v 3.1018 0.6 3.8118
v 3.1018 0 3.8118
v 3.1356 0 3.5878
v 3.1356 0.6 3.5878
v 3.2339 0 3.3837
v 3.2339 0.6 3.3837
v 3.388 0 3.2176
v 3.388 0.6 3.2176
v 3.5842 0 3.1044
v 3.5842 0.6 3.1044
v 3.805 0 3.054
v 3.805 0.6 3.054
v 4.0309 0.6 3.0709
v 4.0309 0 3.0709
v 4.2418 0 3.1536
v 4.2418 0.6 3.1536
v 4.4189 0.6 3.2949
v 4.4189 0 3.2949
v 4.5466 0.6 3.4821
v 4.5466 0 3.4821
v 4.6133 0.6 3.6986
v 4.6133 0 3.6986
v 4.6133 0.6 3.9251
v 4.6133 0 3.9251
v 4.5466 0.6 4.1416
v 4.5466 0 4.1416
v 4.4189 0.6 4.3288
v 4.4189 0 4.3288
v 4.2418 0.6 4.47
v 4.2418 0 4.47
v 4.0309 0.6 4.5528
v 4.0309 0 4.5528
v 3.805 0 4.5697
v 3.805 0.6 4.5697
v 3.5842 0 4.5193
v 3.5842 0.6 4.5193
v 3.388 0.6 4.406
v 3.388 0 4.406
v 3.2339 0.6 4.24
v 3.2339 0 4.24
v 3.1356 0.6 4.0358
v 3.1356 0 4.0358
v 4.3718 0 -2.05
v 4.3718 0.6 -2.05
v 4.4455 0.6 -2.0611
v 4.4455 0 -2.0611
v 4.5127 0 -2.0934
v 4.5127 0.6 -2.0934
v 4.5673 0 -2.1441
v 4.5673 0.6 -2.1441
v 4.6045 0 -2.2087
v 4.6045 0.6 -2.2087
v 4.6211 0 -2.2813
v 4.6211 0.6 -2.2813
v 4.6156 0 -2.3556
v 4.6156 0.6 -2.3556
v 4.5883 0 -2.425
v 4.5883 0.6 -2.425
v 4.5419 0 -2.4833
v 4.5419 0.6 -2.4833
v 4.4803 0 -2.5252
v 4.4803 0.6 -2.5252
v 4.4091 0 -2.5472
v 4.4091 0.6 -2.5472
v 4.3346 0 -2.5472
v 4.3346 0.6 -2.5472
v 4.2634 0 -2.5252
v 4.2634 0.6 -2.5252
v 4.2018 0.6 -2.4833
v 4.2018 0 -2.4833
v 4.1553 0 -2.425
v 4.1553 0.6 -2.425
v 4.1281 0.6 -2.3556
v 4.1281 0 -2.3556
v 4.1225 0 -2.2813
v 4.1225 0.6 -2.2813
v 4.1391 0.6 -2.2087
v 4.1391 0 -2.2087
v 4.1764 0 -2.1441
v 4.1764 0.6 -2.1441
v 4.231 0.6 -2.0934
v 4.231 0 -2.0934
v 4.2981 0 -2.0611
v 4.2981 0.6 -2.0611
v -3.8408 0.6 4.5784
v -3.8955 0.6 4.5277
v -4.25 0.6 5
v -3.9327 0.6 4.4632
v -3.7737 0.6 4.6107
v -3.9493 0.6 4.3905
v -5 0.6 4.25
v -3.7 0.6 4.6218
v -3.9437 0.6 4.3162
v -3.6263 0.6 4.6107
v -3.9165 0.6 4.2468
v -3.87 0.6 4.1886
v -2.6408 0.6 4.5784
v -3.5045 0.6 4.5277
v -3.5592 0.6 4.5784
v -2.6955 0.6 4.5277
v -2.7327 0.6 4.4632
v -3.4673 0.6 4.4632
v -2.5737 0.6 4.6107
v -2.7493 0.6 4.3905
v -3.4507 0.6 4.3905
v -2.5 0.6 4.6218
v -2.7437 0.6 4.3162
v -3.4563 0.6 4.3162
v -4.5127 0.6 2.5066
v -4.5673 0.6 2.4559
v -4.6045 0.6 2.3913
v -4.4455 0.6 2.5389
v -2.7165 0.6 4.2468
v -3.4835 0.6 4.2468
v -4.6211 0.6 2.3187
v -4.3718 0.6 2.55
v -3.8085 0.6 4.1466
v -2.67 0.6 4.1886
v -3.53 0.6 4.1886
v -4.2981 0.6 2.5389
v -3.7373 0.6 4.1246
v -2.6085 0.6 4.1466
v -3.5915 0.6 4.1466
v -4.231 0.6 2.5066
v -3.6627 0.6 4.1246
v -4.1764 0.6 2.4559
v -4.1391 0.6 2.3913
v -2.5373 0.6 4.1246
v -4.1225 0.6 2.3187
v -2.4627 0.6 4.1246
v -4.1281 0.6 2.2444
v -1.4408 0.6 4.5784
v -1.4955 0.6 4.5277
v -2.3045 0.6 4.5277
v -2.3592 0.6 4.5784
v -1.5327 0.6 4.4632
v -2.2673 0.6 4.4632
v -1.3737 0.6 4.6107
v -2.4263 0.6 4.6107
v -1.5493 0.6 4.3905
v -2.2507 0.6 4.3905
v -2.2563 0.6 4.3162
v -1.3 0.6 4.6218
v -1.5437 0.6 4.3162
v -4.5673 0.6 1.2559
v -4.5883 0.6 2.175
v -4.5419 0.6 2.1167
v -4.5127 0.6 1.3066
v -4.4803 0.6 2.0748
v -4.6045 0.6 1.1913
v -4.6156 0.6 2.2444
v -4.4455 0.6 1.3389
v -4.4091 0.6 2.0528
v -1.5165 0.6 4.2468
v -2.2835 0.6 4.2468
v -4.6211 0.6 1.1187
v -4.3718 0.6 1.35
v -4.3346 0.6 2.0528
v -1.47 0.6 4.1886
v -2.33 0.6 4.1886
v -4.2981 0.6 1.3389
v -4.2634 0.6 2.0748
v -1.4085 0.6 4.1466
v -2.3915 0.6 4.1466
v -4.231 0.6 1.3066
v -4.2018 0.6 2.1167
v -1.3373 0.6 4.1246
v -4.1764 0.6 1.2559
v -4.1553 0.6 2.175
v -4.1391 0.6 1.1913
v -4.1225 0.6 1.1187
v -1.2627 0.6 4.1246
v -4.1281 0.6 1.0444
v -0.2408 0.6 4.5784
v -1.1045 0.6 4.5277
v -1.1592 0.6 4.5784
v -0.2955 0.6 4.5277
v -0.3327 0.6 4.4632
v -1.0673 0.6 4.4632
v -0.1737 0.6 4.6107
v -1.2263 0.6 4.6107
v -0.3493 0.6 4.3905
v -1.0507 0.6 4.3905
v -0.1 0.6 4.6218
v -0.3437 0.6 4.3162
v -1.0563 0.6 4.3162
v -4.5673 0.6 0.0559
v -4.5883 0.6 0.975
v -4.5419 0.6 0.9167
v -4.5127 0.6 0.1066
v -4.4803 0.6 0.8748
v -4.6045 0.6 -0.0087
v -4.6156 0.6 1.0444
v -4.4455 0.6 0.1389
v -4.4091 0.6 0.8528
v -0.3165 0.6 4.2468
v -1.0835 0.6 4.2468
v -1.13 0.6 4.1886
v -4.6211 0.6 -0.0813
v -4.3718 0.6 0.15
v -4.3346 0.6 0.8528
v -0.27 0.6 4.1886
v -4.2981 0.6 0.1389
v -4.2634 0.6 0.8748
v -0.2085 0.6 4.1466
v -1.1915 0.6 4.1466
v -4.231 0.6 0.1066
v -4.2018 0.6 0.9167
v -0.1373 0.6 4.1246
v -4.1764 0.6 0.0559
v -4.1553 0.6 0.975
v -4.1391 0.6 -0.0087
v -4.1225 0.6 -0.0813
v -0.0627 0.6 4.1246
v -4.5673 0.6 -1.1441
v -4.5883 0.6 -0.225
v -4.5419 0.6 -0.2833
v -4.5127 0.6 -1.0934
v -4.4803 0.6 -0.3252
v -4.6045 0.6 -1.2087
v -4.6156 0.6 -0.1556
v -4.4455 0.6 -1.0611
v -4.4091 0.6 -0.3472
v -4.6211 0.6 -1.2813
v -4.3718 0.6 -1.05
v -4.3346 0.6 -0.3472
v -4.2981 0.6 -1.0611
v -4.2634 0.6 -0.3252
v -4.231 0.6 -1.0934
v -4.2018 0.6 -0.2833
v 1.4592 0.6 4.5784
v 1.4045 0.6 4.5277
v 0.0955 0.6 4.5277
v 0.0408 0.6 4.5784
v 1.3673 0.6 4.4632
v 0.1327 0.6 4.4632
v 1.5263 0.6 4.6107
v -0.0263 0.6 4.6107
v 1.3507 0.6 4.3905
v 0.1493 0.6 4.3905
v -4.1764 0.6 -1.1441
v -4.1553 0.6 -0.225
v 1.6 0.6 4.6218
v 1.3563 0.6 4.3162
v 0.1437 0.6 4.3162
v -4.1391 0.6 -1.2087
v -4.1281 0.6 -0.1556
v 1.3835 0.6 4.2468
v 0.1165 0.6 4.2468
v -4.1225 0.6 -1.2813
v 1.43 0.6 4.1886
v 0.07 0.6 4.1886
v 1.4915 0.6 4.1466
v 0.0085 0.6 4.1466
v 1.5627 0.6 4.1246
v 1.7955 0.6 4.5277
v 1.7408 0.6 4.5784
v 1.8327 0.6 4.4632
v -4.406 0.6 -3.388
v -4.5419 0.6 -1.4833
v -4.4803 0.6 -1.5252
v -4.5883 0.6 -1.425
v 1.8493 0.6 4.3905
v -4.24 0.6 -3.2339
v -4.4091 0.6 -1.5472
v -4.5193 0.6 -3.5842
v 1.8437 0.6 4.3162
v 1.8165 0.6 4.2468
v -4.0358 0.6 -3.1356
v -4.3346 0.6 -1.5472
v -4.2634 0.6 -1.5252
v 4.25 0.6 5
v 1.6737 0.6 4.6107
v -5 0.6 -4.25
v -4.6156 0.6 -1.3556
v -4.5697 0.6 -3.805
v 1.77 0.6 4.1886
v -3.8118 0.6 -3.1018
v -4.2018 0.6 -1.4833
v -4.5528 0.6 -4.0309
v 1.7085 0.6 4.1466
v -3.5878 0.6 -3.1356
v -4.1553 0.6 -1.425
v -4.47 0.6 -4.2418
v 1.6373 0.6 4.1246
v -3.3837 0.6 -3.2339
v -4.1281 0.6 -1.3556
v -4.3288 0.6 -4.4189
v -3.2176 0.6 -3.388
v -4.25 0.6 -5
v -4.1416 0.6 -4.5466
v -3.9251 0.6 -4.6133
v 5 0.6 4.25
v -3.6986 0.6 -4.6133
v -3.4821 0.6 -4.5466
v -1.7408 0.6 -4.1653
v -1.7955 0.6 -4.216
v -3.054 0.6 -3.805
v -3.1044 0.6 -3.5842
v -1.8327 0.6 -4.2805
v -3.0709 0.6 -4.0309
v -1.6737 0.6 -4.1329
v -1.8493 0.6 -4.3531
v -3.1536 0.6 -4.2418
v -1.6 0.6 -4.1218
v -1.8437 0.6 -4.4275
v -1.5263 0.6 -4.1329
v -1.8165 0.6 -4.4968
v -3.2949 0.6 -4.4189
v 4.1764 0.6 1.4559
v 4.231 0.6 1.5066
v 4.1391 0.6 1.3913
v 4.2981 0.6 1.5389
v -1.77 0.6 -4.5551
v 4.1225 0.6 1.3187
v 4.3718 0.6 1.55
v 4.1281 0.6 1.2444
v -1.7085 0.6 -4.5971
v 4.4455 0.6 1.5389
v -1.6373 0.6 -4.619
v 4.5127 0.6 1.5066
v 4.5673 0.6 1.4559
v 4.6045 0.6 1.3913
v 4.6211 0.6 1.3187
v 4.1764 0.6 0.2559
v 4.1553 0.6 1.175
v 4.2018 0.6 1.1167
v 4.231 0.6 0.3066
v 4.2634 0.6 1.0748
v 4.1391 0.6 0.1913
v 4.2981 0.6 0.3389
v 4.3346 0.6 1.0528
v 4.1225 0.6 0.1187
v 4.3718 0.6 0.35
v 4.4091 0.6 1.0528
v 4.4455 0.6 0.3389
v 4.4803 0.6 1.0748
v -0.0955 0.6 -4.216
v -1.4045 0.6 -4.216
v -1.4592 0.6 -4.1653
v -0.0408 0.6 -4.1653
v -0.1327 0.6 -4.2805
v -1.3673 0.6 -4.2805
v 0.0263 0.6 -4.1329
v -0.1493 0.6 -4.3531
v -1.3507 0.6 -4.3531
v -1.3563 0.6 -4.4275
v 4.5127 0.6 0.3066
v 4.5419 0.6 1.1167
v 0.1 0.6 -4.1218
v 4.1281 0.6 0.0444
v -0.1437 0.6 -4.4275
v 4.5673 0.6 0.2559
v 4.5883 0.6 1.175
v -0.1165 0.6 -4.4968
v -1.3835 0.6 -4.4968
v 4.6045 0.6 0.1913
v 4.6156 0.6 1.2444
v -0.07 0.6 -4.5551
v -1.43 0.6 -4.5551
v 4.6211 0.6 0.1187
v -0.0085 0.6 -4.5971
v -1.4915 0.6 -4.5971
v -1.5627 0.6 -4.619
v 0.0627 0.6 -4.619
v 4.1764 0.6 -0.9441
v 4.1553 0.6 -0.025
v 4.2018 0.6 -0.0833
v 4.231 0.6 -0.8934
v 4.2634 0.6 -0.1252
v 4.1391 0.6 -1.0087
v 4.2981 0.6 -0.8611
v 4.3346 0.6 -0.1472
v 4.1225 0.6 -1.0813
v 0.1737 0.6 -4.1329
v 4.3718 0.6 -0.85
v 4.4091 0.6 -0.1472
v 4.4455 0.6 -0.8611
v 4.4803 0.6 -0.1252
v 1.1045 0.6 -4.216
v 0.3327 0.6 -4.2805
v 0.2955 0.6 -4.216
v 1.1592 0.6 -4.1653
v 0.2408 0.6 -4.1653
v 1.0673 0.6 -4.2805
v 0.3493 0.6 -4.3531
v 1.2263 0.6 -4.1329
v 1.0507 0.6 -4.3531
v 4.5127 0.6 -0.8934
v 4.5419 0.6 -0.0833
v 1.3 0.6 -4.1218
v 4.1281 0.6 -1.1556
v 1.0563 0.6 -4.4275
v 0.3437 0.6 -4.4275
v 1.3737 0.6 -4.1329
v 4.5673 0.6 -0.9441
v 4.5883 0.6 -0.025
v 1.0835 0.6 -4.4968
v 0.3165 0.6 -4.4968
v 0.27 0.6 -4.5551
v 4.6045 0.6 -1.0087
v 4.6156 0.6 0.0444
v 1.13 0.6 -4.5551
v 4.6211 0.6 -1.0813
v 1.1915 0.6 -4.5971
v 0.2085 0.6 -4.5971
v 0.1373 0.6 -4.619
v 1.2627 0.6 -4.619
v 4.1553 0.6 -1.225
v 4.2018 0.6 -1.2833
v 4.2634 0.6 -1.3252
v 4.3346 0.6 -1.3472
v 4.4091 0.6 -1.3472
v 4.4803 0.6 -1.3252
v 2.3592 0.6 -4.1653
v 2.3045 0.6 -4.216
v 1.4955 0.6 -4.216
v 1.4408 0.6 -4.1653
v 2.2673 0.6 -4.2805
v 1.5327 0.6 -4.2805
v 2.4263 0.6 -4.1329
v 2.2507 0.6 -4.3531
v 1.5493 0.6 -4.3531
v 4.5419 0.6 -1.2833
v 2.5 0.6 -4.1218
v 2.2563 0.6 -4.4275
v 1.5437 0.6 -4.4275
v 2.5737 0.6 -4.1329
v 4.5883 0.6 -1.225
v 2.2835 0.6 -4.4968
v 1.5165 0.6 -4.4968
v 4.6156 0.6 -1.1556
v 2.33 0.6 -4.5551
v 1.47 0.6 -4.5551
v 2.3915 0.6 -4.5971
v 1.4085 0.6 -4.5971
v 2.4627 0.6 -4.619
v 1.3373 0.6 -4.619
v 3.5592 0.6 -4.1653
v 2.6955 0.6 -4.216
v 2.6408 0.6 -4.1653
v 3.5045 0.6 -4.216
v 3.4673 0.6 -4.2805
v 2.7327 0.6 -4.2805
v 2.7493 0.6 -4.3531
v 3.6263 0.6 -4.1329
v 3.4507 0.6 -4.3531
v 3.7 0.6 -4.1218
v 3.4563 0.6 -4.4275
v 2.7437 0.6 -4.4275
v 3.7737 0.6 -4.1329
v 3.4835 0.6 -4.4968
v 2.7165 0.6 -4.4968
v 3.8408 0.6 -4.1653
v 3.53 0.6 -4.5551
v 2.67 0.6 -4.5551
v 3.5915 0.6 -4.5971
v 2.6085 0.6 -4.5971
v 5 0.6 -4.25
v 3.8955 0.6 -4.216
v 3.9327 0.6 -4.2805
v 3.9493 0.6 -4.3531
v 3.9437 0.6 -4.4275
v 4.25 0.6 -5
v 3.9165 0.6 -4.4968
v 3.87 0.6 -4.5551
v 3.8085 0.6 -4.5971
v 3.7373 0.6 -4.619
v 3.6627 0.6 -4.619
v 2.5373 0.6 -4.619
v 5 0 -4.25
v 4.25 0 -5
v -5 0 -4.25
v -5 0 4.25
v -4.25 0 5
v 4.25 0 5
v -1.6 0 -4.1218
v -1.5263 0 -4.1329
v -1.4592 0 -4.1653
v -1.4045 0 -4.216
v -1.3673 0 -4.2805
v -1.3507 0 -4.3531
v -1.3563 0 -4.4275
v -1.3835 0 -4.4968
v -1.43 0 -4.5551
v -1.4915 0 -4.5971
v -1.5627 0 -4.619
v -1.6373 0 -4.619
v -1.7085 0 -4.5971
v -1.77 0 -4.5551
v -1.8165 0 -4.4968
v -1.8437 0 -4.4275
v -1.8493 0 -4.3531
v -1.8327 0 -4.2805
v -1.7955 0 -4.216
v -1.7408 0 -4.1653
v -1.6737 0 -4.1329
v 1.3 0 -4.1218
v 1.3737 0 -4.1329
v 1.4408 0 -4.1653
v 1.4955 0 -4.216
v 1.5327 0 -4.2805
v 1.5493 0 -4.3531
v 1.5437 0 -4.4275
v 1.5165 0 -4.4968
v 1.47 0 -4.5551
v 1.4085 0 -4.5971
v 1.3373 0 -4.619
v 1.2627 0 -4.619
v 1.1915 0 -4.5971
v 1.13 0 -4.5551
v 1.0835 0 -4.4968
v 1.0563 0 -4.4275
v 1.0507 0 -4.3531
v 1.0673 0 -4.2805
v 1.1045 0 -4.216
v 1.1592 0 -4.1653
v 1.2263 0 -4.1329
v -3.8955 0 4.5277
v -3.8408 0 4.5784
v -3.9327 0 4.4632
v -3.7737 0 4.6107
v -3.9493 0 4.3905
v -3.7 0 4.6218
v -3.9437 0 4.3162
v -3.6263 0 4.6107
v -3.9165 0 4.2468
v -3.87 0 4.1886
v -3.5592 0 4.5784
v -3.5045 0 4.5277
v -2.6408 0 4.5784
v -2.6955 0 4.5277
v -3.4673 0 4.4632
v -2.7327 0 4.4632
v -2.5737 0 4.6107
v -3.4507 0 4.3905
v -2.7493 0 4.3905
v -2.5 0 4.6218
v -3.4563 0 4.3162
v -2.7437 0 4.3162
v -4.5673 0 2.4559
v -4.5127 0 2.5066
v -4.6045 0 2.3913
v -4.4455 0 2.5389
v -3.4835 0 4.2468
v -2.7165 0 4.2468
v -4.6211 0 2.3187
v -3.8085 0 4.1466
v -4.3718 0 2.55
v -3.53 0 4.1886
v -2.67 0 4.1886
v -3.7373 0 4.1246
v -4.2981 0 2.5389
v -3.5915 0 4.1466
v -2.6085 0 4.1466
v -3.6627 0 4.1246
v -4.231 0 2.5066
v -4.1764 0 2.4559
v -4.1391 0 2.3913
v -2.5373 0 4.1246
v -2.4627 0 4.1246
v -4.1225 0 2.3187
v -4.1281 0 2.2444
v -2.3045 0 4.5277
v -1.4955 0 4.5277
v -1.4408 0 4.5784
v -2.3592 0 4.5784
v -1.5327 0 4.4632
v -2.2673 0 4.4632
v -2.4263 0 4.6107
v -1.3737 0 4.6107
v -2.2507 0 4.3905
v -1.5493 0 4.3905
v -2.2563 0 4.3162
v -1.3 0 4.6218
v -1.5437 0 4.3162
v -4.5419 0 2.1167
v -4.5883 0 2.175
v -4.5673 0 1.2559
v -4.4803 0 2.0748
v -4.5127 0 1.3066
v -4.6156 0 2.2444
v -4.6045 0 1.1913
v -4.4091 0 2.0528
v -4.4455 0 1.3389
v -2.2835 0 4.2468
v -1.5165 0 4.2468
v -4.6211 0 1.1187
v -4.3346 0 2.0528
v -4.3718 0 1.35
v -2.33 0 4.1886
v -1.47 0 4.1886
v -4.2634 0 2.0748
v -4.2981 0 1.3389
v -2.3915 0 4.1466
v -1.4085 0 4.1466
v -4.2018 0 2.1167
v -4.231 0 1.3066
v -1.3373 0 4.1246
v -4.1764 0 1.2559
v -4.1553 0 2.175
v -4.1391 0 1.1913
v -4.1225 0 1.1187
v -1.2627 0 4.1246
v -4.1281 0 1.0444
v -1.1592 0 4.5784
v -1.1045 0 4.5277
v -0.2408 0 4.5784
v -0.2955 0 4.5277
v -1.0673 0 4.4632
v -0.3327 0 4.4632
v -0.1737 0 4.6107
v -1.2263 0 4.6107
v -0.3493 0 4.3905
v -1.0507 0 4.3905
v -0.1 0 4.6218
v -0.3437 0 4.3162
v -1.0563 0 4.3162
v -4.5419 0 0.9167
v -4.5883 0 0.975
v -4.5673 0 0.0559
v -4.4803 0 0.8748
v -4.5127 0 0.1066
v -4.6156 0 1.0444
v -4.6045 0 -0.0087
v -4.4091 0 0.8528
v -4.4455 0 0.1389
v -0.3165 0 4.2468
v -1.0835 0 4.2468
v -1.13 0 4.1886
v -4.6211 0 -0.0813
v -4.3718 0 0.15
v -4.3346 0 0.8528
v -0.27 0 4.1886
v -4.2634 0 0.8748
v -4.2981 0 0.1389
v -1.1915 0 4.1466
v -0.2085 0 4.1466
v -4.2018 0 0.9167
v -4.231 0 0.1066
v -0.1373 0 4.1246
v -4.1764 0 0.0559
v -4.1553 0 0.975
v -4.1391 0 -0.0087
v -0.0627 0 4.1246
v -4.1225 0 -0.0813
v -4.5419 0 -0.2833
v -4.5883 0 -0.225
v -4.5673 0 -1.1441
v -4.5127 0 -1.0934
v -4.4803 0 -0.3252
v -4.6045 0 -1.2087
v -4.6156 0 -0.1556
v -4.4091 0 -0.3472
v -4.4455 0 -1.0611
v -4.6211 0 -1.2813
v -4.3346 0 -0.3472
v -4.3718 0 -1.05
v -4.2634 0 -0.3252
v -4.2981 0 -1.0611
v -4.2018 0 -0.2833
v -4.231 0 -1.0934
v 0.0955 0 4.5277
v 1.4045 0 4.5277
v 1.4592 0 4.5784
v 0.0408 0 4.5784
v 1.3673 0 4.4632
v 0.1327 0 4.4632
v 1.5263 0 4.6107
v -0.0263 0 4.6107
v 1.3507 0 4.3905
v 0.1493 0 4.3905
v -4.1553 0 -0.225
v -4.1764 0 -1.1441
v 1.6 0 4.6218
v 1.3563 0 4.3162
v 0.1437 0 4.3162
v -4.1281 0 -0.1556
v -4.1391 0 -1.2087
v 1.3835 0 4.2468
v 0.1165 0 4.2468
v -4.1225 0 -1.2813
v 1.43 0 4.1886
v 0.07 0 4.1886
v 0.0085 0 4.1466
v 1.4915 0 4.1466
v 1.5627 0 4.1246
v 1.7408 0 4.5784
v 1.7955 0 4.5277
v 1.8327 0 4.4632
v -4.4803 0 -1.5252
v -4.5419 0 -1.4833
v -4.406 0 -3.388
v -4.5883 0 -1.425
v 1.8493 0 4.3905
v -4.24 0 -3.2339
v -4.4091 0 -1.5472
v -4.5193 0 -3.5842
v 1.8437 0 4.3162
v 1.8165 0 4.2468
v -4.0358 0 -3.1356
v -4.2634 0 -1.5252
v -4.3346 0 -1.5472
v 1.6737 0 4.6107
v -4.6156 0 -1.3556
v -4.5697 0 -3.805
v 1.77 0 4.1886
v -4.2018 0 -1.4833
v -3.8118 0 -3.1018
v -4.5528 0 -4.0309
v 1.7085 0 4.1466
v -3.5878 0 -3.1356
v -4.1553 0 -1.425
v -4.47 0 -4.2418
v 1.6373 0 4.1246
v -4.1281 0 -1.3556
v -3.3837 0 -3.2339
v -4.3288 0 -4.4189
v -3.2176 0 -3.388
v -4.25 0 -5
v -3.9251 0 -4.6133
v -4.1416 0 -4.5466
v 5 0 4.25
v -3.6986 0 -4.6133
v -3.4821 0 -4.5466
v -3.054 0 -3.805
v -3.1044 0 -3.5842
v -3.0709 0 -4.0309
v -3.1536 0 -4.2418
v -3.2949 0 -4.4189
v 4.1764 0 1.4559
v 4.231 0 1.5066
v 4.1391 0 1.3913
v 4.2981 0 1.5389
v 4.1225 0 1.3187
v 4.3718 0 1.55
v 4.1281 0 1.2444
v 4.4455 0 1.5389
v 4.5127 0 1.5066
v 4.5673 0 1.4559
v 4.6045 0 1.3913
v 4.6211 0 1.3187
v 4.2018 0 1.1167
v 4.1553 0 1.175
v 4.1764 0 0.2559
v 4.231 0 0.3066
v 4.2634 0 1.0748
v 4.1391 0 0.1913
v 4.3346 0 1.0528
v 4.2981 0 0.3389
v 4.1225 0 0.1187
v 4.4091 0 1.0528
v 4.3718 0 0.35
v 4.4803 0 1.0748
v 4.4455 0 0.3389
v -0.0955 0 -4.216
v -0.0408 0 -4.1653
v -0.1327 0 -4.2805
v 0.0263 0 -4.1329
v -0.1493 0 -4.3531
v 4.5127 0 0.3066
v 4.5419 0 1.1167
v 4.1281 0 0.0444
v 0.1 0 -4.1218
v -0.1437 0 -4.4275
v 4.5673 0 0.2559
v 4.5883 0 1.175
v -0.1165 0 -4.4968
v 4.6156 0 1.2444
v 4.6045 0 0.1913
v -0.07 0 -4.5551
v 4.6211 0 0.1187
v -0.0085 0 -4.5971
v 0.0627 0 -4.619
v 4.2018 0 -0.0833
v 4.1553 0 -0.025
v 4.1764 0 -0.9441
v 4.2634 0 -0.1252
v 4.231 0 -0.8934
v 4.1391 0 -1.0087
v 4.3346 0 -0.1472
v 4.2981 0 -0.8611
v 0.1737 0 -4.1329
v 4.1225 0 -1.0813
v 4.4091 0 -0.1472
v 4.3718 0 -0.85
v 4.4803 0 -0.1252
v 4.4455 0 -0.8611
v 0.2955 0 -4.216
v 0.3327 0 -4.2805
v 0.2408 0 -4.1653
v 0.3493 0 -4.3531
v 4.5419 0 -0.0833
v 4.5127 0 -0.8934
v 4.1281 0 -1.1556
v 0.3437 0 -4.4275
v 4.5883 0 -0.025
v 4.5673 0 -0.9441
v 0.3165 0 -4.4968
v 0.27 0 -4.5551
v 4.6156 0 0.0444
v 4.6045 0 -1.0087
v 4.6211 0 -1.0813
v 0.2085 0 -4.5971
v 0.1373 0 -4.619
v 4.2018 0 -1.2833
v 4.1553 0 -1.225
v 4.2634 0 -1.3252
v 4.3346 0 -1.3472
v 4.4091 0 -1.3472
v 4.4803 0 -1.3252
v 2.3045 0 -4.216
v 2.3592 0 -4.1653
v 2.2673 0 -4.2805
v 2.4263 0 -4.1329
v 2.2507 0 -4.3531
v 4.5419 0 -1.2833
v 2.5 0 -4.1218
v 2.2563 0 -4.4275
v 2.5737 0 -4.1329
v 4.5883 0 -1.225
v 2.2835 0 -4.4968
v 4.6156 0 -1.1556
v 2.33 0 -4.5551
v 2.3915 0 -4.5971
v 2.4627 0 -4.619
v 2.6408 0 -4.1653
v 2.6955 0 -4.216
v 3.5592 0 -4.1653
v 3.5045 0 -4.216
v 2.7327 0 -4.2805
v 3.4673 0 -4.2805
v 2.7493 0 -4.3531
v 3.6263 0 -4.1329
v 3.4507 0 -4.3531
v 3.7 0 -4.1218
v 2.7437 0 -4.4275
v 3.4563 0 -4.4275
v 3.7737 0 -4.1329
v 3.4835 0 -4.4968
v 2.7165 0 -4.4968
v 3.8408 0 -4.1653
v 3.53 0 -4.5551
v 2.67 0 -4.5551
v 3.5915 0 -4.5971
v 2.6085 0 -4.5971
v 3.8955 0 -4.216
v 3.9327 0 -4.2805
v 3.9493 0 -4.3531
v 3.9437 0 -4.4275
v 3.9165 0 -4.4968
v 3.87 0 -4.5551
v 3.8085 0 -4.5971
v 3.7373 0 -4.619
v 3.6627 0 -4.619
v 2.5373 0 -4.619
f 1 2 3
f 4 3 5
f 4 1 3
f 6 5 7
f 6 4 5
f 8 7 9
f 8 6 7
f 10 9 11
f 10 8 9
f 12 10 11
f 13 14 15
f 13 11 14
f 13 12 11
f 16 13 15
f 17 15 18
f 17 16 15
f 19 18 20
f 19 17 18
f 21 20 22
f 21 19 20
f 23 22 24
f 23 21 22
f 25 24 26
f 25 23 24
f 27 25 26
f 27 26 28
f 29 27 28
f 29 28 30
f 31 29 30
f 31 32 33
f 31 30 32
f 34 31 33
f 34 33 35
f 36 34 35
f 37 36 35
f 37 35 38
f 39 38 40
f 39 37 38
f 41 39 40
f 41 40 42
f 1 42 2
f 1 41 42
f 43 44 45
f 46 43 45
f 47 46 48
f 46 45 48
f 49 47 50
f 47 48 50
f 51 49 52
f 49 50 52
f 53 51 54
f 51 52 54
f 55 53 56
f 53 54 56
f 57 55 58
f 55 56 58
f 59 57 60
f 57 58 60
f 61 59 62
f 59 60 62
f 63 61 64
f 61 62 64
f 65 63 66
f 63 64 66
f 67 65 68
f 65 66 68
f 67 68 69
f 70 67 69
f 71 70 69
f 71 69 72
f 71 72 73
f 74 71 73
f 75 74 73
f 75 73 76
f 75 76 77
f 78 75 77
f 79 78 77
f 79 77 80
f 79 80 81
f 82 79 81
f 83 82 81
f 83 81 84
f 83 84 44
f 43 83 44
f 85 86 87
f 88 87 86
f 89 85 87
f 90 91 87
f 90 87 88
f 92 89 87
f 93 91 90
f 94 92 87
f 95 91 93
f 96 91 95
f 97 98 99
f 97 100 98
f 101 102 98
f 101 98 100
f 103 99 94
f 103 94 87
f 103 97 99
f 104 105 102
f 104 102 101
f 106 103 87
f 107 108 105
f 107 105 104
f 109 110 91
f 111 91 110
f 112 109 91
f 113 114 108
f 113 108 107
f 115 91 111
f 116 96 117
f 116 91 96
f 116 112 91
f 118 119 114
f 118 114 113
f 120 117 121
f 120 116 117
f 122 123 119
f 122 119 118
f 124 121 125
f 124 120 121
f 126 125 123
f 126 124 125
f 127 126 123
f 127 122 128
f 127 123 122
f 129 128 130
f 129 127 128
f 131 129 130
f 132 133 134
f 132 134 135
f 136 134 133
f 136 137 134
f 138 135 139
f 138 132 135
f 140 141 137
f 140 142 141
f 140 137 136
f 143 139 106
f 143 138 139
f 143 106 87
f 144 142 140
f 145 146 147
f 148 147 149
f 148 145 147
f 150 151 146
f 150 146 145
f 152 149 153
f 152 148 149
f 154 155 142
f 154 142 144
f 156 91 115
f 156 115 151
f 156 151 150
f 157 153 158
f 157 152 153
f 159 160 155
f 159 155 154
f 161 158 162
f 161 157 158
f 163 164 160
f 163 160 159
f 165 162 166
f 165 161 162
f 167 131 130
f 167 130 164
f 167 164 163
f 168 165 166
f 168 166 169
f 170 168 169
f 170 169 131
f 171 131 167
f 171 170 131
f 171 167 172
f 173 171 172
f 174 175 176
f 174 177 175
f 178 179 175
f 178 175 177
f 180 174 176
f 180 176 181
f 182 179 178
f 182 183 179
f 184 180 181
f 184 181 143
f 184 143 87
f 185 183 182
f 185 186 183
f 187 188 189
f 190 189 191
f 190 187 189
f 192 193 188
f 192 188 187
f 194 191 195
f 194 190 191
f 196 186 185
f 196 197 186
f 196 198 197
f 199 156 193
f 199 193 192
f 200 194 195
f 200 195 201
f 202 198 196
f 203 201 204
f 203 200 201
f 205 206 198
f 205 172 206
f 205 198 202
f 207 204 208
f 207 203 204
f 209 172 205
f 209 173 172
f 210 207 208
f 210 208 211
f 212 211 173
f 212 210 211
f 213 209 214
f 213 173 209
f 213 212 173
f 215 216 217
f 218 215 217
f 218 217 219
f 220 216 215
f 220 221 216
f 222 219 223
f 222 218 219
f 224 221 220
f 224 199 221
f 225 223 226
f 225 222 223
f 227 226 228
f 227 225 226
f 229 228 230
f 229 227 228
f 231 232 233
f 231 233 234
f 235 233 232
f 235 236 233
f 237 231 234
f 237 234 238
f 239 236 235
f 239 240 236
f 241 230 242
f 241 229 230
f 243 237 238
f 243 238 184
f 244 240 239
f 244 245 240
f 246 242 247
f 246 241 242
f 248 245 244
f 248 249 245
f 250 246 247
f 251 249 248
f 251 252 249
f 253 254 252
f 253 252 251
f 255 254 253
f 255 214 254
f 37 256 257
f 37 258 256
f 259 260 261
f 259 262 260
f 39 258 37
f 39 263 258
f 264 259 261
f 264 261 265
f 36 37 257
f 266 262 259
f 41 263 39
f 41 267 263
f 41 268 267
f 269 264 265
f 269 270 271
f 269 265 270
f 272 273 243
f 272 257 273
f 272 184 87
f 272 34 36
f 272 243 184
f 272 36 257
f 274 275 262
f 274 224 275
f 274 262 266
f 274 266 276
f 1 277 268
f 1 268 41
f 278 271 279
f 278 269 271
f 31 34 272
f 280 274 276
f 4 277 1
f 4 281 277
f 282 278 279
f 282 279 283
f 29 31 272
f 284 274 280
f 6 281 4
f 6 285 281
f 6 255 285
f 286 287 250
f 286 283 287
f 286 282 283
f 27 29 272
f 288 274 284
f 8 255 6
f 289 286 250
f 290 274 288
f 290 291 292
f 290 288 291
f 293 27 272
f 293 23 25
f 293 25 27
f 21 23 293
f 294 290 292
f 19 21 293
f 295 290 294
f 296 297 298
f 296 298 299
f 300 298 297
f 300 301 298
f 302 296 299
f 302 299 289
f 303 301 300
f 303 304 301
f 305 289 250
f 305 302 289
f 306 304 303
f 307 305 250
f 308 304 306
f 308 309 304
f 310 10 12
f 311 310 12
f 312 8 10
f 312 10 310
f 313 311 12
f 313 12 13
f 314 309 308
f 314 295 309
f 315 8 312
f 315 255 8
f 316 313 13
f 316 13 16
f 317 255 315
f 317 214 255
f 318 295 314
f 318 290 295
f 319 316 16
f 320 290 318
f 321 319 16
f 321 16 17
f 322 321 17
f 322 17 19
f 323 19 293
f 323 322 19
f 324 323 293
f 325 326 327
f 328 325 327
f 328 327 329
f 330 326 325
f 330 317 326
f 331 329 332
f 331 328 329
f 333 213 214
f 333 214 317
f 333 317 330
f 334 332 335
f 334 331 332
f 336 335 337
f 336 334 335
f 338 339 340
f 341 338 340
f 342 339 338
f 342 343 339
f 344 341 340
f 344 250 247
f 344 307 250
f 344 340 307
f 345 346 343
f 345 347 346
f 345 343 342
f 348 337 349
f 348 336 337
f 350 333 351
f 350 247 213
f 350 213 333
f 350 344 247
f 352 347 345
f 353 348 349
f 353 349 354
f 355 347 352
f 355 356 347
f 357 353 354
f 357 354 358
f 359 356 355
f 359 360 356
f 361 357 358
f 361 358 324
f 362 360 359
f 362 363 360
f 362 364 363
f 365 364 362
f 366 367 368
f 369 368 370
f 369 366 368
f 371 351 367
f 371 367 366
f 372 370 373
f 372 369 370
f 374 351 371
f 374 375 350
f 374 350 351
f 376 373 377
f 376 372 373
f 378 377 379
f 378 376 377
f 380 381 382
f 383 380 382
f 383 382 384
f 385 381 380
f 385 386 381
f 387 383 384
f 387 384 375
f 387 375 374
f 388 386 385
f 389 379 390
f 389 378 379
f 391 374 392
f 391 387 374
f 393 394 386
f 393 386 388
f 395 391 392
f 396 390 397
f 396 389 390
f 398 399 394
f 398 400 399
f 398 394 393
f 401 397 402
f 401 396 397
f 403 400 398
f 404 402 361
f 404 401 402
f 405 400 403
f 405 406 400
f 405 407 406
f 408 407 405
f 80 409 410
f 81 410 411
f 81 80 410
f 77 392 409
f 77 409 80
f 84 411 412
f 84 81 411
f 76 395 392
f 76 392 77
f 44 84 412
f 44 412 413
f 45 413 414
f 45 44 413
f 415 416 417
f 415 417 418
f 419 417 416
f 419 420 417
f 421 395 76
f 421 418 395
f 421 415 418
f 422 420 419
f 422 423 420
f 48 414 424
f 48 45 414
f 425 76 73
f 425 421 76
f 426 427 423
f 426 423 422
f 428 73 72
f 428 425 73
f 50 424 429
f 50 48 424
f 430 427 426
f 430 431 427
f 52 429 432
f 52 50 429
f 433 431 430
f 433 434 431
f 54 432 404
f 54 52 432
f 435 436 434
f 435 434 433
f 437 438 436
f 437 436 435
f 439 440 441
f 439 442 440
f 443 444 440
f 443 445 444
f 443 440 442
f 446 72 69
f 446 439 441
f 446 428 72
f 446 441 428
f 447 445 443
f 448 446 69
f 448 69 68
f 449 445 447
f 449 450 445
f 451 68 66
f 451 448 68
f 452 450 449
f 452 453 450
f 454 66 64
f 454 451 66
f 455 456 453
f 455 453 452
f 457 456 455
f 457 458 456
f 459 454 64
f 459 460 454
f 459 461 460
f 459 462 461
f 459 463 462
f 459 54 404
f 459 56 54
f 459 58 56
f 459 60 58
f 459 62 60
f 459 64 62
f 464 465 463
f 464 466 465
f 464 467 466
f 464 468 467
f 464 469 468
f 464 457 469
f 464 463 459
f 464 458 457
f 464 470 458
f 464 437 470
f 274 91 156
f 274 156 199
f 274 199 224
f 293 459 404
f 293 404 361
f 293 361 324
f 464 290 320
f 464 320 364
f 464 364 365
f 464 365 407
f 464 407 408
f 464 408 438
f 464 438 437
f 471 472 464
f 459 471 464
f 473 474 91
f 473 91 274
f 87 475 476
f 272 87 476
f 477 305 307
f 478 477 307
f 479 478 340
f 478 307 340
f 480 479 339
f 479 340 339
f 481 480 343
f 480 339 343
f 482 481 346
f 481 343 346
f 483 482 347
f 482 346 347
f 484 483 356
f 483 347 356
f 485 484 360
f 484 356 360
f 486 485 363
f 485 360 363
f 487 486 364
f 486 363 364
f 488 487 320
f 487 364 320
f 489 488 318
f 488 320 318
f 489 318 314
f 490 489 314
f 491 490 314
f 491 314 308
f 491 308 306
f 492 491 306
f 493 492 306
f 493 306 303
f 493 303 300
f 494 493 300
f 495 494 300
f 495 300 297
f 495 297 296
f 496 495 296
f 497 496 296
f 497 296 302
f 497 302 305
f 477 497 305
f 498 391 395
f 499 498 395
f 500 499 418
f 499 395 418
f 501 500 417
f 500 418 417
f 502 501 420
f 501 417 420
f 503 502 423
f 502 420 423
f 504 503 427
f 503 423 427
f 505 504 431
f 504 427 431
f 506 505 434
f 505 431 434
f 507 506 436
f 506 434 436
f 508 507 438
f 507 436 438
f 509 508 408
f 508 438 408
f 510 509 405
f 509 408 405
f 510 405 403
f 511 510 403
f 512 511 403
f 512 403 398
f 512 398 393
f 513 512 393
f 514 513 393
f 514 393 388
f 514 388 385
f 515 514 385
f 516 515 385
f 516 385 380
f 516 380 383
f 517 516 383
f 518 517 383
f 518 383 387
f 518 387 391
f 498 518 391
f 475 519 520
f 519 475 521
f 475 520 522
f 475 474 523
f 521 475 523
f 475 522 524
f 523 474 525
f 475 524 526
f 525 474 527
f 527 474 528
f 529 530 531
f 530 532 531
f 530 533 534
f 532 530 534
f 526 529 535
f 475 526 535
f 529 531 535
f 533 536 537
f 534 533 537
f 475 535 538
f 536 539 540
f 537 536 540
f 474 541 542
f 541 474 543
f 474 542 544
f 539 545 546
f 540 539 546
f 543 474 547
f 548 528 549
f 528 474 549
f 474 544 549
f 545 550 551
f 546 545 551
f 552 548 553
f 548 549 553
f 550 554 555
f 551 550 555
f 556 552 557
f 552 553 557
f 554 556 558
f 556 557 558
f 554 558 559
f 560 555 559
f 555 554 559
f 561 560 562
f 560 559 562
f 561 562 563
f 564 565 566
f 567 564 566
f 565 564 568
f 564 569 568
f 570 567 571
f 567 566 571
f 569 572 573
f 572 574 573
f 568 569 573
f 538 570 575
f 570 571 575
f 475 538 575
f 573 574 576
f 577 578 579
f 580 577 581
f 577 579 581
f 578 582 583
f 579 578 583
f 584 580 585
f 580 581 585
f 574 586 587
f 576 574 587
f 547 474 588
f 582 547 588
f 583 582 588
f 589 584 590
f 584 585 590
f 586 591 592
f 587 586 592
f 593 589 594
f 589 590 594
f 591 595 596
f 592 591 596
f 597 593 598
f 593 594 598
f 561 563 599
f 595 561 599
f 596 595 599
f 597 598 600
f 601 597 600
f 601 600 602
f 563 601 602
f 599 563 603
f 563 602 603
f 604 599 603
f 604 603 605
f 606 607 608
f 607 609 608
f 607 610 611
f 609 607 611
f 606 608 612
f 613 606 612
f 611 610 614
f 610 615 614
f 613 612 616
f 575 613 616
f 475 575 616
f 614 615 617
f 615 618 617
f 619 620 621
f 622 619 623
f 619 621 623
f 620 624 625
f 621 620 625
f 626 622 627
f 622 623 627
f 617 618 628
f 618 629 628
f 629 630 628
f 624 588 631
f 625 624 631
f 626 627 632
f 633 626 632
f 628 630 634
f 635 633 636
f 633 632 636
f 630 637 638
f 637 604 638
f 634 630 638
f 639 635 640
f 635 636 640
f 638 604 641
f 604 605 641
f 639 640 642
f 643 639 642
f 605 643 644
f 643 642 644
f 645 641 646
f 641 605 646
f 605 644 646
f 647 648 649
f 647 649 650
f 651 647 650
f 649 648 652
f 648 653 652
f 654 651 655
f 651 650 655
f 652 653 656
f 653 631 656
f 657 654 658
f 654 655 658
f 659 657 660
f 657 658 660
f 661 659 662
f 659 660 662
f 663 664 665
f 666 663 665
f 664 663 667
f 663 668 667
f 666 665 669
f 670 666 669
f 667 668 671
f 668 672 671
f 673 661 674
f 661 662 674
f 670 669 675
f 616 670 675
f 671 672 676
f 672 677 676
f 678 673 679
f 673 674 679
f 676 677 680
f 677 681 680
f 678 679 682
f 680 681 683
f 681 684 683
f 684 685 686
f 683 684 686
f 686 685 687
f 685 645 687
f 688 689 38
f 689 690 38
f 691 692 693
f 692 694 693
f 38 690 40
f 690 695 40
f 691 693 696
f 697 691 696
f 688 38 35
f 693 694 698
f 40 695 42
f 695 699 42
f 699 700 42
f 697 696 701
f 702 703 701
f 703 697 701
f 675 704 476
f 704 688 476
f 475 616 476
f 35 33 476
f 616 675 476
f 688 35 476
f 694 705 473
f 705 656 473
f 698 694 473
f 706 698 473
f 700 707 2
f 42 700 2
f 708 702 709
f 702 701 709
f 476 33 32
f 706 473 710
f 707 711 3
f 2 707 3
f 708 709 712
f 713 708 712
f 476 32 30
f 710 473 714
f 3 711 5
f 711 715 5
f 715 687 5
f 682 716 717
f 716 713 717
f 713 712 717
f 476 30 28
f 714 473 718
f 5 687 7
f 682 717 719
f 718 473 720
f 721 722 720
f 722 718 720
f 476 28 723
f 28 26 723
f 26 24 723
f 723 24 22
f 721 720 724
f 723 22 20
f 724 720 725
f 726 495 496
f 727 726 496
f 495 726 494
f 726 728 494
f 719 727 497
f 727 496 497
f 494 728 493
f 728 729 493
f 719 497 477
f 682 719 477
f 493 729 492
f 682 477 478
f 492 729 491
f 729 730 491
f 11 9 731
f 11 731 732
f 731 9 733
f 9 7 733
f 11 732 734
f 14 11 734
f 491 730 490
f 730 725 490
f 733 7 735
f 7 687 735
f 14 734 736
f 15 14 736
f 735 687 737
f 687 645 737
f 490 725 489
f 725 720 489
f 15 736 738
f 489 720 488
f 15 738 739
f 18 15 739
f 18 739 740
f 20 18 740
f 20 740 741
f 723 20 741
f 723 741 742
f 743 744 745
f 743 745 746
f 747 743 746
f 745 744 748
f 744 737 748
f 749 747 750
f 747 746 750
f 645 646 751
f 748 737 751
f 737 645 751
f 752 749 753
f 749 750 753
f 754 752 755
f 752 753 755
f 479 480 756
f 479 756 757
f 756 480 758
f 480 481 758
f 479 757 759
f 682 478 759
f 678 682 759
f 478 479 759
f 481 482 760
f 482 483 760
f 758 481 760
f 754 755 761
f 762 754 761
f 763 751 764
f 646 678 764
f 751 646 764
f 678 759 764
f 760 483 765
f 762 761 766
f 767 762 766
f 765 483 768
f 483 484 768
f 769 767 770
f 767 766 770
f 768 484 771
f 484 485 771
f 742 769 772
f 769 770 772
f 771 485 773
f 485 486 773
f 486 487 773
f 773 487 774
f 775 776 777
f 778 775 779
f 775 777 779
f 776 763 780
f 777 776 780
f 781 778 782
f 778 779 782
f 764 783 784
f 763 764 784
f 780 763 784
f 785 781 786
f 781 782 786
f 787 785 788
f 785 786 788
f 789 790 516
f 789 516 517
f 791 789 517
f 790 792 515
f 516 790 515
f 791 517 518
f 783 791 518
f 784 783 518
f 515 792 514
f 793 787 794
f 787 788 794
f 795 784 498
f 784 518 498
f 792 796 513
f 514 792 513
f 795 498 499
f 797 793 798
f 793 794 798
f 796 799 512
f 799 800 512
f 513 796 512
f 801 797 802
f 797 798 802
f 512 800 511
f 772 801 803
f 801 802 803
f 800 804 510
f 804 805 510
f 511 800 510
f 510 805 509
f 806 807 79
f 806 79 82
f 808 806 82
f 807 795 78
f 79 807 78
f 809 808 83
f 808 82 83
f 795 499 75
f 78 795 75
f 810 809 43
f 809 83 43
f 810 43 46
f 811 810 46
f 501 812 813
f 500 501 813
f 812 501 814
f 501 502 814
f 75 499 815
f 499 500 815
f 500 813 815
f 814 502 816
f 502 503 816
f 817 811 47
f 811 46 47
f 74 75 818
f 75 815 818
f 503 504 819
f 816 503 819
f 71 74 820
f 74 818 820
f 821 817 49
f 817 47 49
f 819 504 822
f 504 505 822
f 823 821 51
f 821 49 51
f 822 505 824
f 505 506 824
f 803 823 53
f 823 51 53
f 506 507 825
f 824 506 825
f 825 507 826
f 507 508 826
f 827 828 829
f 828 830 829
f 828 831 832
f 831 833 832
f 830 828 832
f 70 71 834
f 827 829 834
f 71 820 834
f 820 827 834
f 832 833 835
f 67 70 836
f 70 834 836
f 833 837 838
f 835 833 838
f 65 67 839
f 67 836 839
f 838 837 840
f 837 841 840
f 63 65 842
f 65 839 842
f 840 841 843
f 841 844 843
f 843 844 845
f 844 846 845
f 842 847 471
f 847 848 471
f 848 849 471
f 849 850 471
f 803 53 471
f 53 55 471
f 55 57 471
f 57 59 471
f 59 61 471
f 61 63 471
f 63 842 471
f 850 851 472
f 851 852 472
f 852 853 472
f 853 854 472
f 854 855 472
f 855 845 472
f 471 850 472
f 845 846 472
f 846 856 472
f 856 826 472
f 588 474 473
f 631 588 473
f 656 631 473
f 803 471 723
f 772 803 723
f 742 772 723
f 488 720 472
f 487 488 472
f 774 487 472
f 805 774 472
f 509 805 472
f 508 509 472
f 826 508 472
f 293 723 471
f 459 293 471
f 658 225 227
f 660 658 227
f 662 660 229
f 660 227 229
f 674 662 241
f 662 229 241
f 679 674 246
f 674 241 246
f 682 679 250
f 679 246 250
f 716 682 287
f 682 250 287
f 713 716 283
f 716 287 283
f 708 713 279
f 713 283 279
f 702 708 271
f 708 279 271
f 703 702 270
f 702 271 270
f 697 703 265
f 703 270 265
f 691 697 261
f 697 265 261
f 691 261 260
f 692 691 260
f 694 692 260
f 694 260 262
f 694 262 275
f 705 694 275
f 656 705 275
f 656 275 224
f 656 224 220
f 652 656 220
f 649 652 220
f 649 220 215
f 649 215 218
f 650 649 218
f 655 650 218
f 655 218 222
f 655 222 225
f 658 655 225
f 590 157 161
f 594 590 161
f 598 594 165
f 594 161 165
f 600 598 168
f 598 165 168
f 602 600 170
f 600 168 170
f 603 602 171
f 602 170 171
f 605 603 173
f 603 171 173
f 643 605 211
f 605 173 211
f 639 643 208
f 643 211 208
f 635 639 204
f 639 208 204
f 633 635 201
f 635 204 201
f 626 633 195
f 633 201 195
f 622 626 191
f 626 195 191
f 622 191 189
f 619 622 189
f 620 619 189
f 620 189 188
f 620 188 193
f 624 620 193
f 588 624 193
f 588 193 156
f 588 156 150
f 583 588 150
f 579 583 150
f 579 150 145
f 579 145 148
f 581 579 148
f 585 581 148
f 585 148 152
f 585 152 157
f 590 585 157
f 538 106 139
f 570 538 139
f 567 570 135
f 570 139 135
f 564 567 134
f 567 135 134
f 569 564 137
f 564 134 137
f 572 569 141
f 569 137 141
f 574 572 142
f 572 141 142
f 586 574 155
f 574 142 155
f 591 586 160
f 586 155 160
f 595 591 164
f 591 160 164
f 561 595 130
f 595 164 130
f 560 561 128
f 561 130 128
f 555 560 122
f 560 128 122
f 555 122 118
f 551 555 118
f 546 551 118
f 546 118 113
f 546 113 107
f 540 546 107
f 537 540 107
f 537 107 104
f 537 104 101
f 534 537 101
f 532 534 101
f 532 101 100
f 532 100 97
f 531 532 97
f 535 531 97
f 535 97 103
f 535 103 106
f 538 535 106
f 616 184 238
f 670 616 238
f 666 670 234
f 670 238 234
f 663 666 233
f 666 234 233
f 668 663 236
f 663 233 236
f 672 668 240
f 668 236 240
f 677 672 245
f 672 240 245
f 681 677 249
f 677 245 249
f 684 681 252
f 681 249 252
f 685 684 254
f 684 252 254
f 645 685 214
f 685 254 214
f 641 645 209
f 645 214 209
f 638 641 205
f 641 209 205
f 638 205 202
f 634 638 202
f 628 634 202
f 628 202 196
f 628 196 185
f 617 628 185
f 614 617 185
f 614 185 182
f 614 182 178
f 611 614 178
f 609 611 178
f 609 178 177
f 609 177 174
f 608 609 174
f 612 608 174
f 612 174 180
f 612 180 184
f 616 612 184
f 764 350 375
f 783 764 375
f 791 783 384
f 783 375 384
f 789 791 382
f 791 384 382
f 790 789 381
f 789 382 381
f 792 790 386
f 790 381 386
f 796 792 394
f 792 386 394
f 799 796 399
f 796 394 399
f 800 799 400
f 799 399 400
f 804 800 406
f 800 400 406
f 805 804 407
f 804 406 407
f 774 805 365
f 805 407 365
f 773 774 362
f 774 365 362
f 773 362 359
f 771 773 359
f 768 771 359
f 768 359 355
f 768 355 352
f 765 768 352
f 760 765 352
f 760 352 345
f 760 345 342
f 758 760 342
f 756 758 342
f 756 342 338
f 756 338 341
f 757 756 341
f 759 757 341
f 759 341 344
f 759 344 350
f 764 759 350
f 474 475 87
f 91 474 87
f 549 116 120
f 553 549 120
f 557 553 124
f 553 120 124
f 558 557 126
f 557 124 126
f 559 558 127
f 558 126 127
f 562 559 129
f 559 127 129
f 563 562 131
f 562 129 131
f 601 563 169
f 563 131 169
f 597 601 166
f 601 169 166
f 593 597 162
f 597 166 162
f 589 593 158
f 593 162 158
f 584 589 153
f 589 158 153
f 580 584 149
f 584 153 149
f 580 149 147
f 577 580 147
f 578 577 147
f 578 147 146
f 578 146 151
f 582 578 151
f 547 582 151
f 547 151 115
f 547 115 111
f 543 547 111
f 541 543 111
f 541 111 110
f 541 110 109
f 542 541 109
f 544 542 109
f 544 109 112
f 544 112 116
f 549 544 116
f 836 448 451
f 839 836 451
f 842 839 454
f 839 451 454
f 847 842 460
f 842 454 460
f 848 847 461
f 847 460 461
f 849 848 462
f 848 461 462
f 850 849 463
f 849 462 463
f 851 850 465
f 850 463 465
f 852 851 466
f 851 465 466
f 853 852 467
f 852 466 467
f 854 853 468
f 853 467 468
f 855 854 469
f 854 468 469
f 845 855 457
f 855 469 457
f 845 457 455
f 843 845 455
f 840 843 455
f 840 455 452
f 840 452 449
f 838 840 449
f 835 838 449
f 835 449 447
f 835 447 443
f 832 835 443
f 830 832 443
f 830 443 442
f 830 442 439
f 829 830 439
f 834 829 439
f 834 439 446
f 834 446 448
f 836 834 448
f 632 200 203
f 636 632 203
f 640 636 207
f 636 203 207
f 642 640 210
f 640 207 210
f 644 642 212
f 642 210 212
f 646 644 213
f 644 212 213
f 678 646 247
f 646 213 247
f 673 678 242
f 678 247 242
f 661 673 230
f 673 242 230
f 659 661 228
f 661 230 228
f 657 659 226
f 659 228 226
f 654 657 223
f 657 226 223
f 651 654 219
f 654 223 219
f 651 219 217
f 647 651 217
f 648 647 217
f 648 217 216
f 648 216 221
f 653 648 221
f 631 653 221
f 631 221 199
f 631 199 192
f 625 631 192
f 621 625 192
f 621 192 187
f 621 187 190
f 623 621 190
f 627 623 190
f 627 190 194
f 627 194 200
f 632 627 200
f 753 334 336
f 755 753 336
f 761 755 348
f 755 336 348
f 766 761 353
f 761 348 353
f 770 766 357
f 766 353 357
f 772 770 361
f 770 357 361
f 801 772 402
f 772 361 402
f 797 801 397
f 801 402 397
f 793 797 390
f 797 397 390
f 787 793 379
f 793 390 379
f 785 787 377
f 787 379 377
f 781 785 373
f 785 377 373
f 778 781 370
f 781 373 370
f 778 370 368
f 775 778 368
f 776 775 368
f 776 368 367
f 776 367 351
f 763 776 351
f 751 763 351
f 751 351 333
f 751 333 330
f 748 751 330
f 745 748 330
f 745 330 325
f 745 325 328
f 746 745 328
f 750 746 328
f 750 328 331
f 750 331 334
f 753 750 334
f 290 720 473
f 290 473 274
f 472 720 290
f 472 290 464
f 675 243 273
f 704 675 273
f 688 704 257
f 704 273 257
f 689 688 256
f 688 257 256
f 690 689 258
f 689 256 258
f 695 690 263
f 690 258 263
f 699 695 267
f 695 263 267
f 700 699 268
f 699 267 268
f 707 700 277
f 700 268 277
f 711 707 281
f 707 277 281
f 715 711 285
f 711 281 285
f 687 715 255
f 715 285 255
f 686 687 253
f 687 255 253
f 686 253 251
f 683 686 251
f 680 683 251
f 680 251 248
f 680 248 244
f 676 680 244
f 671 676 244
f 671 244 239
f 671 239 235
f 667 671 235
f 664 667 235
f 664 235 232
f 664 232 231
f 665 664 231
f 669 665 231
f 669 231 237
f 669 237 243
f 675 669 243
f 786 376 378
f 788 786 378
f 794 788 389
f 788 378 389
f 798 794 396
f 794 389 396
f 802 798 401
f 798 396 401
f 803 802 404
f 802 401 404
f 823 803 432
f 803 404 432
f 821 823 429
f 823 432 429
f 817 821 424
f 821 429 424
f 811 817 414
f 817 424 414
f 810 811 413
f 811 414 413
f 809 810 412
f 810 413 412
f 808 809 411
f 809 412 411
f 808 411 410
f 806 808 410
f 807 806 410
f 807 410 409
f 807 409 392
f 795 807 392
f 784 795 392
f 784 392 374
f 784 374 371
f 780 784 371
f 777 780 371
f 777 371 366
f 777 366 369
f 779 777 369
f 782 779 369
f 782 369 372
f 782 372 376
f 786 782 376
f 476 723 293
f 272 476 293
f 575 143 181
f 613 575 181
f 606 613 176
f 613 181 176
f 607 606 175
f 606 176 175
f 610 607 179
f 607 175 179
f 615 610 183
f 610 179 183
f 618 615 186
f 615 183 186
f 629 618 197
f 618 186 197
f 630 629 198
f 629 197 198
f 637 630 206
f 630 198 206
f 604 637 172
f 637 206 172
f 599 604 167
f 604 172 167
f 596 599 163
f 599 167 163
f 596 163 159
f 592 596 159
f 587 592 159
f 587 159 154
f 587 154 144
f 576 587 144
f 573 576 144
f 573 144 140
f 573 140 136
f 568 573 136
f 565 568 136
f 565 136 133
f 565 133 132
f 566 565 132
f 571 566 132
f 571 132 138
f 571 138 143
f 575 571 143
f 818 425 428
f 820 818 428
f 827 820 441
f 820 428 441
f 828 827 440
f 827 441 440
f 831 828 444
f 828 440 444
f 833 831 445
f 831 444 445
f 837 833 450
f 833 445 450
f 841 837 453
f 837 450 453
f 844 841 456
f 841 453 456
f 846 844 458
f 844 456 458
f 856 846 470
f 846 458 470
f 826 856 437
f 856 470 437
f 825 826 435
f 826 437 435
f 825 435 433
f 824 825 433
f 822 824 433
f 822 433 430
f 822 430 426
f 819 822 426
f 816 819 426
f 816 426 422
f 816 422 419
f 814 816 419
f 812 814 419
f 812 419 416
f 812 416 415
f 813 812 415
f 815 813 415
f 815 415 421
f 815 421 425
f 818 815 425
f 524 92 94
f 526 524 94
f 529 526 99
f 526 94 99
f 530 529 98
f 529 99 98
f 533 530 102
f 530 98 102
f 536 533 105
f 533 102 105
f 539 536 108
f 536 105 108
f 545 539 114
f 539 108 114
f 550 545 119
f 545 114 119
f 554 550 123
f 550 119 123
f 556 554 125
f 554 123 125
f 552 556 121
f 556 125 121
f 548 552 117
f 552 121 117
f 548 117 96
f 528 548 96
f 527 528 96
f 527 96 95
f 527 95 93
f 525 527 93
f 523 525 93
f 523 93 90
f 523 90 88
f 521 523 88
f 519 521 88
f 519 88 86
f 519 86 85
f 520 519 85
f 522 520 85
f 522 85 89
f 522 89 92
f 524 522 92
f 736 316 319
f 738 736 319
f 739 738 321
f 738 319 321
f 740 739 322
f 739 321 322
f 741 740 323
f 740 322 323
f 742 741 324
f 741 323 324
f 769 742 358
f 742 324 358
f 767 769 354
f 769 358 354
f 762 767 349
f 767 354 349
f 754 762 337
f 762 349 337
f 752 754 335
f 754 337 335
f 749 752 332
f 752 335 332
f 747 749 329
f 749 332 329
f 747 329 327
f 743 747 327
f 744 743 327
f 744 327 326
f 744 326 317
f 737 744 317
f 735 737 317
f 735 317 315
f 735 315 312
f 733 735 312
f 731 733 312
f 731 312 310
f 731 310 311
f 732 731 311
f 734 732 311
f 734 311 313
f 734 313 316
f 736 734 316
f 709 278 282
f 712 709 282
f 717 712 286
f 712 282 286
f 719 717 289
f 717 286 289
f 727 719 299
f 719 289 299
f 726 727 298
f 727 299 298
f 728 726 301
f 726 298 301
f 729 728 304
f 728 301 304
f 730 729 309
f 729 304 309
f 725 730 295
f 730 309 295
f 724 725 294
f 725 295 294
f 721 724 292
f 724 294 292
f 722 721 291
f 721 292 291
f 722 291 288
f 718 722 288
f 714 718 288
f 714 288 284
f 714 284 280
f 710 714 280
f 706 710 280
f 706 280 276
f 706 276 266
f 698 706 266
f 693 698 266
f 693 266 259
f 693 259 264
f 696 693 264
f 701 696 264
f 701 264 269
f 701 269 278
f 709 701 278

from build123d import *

# Parameters (mm, degrees)
SKETCH1_W           = 10
SKETCH1_H           = 10
BOSS_EXTRUDE1_DEPTH = 0.6
CHAMFER1_SIZE       = 0.75
SKETCH2_R           = 0.76
CUT_EXTRUDE1_DEPTH  = 8.096478
SKETCH13_R          = 0.959787046
BOSS_EXTRUDE2_DEPTH = 0.6
CUT_EXTRUDE9_REACH  = 9.096
SKETCH14_R          = 0.25
LPATTERN5_COUNT     = 2
LPATTERN5_PITCH     = 1.2
LPATTERN5_COL_COUNT = 3
LPATTERN5_COL_PITCH = 1.2
CUT_EXTRUDE10_REACH = 9.096
SKETCH17_R          = 0.25
LPATTERN6_COUNT     = 2
LPATTERN6_PITCH     = 1.2
LPATTERN6_COL_COUNT = 3
LPATTERN6_COL_PITCH = 1.2
CUT_EXTRUDE11_REACH = 9.096
SKETCH18_R          = 0.25
LPATTERN7_COUNT     = 2
LPATTERN7_PITCH     = 1.2
LPATTERN7_COL_COUNT = 3
LPATTERN7_COL_PITCH = 1.2
CUT_EXTRUDE12_REACH = 9.096
SKETCH19_R          = 0.25
CUT_EXTRUDE13_REACH = 9.096
SKETCH20_R          = 0.25
CUT_EXTRUDE14_REACH = 9.096
SKETCH21_R          = 0.25
LPATTERN8_COUNT     = 2
LPATTERN8_PITCH     = 1.2
LPATTERN8_COL_COUNT = 3
LPATTERN8_COL_PITCH = 1.2


with BuildPart() as part:
    # Sketch1 → Boss-Extrude1 (new body)
    with BuildSketch(Plane(origin=(0, 0, 0), x_dir=(1, 0, 0), z_dir=(0, 1, 0))):
        Rectangle(SKETCH1_W, SKETCH1_H)
    extrude(amount=BOSS_EXTRUDE1_DEPTH)

    # Chamfer1
    chamfer1_edges = [part.edges().sort_by_distance(p)[0] for p in [
        (5, 0.3, 5),
        (-5, 0.3, 5),
        (-5, 0.3, -5),
        (5, 0.3, -5),
    ]]
    chamfer(chamfer1_edges, length=CHAMFER1_SIZE)

    # Sketch2 → Cut-Extrude1 (cut, through all)
    with BuildSketch(Plane(origin=(0, 0.6, 0), x_dir=(1, 0, 0), z_dir=(0, 1, 0))):
        with Locations(Location((-3.811827202, 3.861827202, 0), (0, 0, 270))):
            Circle(SKETCH2_R)
    cut_extrude1 = extrude(amount=-CUT_EXTRUDE1_DEPTH, mode=Mode.SUBTRACT)

    # Mirror2: Cut-Extrude1 across plane
    add(cut_extrude1.mirror(Plane(origin=(0, 0, 0), x_dir=(-0.7071067811865482, 0, 0.7071067811865468), z_dir=(-0.7071067811865468, 0, -0.7071067811865482))), mode=Mode.SUBTRACT)

    # Sketch13 → Boss-Extrude2 (add)
    with BuildSketch(Plane(origin=(0, 0.6, 0), x_dir=(1, 0, 0), z_dir=(0, 1, 0))):
        with Locations((3.861827202, -3.811827202)):
            Circle(SKETCH13_R)
    extrude(amount=-BOSS_EXTRUDE2_DEPTH)

    # Sketch14 → Cut-Extrude9 (cut, up to next)
    with BuildSketch(Plane(origin=(0, 0.6, 0), x_dir=(1, 0, 0), z_dir=(0, 1, 0)), mode=Mode.PRIVATE) as cut_extrude9_sk1:
        with Locations(Location((-4.3718272, 0.1, 0), (0, 0, 270))):
            Circle(SKETCH14_R)
    cut_extrude9_tool1 = extrude(cut_extrude9_sk1.sketch, amount=-CUT_EXTRUDE9_REACH, mode=Mode.PRIVATE) & part.part
    cut_extrude9 = cut_extrude9_tool1.solids().sort_by_distance((-4.371827, 0.6, -0.1))[0]
    add(cut_extrude9, mode=Mode.SUBTRACT)

    # LPattern5: Cut-Extrude9 ×2
    with Locations(*[(0, 0, -i * LPATTERN5_PITCH) for i in range(1, LPATTERN5_COUNT)]):
        add(cut_extrude9, mode=Mode.SUBTRACT)

    # LPattern5 col: Cut-Extrude9 ×3
    with Locations(*[(0, 0, i * LPATTERN5_COL_PITCH) for i in range(1, LPATTERN5_COL_COUNT)]):
        add(cut_extrude9, mode=Mode.SUBTRACT)

    # Mirror4: Cut-Extrude1 across plane
    add(cut_extrude1.mirror(Plane(origin=(0, 0, 0), x_dir=(-0.7071067811865482, 0, 0.7071067811865468), z_dir=(-0.7071067811865468, 0, -0.7071067811865482))), mode=Mode.SUBTRACT)

    # Sketch17 → Cut-Extrude10 (cut, up to next)
    with BuildSketch(Plane(origin=(0, 0.6, 0), x_dir=(1, 0, 0), z_dir=(0, 1, 0)), mode=Mode.PRIVATE) as cut_extrude10_sk1:
        with Locations(Location((-2.5, -4.3718272, 0), (0, 0, 270))):
            Circle(SKETCH17_R)
    cut_extrude10_tool1 = extrude(cut_extrude10_sk1.sketch, amount=-CUT_EXTRUDE10_REACH, mode=Mode.PRIVATE) & part.part
    cut_extrude10 = cut_extrude10_tool1.solids().sort_by_distance((-2.5, 0.6, 4.371827))[0]
    add(cut_extrude10, mode=Mode.SUBTRACT)

    # LPattern6: Cut-Extrude10 ×2
    with Locations(*[(-i * LPATTERN6_PITCH, 0, 0) for i in range(1, LPATTERN6_COUNT)]):
        add(cut_extrude10, mode=Mode.SUBTRACT)

    # LPattern6 col: Cut-Extrude10 ×3
    with Locations(*[(i * LPATTERN6_COL_PITCH, 0, 0) for i in range(1, LPATTERN6_COL_COUNT)]):
        add(cut_extrude10, mode=Mode.SUBTRACT)

    # Sketch18 → Cut-Extrude11 (cut, up to next)
    with BuildSketch(Plane(origin=(0, 0.6, 0), x_dir=(1, 0, 0), z_dir=(0, 1, 0)), mode=Mode.PRIVATE) as cut_extrude11_sk1:
        with Locations(Location((2.5, 4.3718272, 0), (0, 0, 270))):
            Circle(SKETCH18_R)
    cut_extrude11_tool1 = extrude(cut_extrude11_sk1.sketch, amount=-CUT_EXTRUDE11_REACH, mode=Mode.PRIVATE) & part.part
    cut_extrude11 = cut_extrude11_tool1.solids().sort_by_distance((2.5, 0.6, -4.371827))[0]
    add(cut_extrude11, mode=Mode.SUBTRACT)

    # LPattern7: Cut-Extrude11 ×2
    with Locations(*[(i * LPATTERN7_PITCH, 0, 0) for i in range(1, LPATTERN7_COUNT)]):
        add(cut_extrude11, mode=Mode.SUBTRACT)

    # LPattern7 col: Cut-Extrude11 ×3
    with Locations(*[(-i * LPATTERN7_COL_PITCH, 0, 0) for i in range(1, LPATTERN7_COL_COUNT)]):
        add(cut_extrude11, mode=Mode.SUBTRACT)

    # Sketch19 → Cut-Extrude12 (cut, up to next)
    with BuildSketch(Plane(origin=(0, 0.6, 0), x_dir=(1, 0, 0), z_dir=(0, 1, 0)), mode=Mode.PRIVATE) as cut_extrude12_sk1:
        with Locations(Location((1.6, -4.3718272, 0), (0, 0, 270))):
            Circle(SKETCH19_R)
    cut_extrude12_tool1 = extrude(cut_extrude12_sk1.sketch, amount=-CUT_EXTRUDE12_REACH, mode=Mode.PRIVATE) & part.part
    add(cut_extrude12_tool1.solids().sort_by_distance((1.6, 0.6, 4.371827))[0], mode=Mode.SUBTRACT)

    # Sketch20 → Cut-Extrude13 (cut, up to next)
    with BuildSketch(Plane(origin=(0, 0.6, 0), x_dir=(1, 0, 0), z_dir=(0, 1, 0)), mode=Mode.PRIVATE) as cut_extrude13_sk1:
        with Locations(Location((-1.6, 4.3718272, 0), (0, 0, 270))):
            Circle(SKETCH20_R)
    cut_extrude13_tool1 = extrude(cut_extrude13_sk1.sketch, amount=-CUT_EXTRUDE13_REACH, mode=Mode.PRIVATE) & part.part
    add(cut_extrude13_tool1.solids().sort_by_distance((-1.6, 0.6, -4.371827))[0], mode=Mode.SUBTRACT)

    # Sketch21 → Cut-Extrude14 (cut, up to next)
    with BuildSketch(Plane(origin=(0, 0.6, 0), x_dir=(1, 0, 0), z_dir=(0, 1, 0)), mode=Mode.PRIVATE) as cut_extrude14_sk1:
        with Locations(Location((4.3718272, -0.1, 0), (0, 0, 270))):
            Circle(SKETCH21_R)
    cut_extrude14_tool1 = extrude(cut_extrude14_sk1.sketch, amount=-CUT_EXTRUDE14_REACH, mode=Mode.PRIVATE) & part.part
    cut_extrude14 = cut_extrude14_tool1.solids().sort_by_distance((4.371827, 0.6, 0.1))[0]
    add(cut_extrude14, mode=Mode.SUBTRACT)

    # LPattern8: Cut-Extrude14 ×2
    with Locations(*[(0, 0, i * LPATTERN8_PITCH) for i in range(1, LPATTERN8_COUNT)]):
        add(cut_extrude14, mode=Mode.SUBTRACT)

    # LPattern8 col: Cut-Extrude14 ×3
    with Locations(*[(0, 0, -i * LPATTERN8_COL_PITCH) for i in range(1, LPATTERN8_COL_COUNT)]):
        add(cut_extrude14, mode=Mode.SUBTRACT)


solid = part.part
